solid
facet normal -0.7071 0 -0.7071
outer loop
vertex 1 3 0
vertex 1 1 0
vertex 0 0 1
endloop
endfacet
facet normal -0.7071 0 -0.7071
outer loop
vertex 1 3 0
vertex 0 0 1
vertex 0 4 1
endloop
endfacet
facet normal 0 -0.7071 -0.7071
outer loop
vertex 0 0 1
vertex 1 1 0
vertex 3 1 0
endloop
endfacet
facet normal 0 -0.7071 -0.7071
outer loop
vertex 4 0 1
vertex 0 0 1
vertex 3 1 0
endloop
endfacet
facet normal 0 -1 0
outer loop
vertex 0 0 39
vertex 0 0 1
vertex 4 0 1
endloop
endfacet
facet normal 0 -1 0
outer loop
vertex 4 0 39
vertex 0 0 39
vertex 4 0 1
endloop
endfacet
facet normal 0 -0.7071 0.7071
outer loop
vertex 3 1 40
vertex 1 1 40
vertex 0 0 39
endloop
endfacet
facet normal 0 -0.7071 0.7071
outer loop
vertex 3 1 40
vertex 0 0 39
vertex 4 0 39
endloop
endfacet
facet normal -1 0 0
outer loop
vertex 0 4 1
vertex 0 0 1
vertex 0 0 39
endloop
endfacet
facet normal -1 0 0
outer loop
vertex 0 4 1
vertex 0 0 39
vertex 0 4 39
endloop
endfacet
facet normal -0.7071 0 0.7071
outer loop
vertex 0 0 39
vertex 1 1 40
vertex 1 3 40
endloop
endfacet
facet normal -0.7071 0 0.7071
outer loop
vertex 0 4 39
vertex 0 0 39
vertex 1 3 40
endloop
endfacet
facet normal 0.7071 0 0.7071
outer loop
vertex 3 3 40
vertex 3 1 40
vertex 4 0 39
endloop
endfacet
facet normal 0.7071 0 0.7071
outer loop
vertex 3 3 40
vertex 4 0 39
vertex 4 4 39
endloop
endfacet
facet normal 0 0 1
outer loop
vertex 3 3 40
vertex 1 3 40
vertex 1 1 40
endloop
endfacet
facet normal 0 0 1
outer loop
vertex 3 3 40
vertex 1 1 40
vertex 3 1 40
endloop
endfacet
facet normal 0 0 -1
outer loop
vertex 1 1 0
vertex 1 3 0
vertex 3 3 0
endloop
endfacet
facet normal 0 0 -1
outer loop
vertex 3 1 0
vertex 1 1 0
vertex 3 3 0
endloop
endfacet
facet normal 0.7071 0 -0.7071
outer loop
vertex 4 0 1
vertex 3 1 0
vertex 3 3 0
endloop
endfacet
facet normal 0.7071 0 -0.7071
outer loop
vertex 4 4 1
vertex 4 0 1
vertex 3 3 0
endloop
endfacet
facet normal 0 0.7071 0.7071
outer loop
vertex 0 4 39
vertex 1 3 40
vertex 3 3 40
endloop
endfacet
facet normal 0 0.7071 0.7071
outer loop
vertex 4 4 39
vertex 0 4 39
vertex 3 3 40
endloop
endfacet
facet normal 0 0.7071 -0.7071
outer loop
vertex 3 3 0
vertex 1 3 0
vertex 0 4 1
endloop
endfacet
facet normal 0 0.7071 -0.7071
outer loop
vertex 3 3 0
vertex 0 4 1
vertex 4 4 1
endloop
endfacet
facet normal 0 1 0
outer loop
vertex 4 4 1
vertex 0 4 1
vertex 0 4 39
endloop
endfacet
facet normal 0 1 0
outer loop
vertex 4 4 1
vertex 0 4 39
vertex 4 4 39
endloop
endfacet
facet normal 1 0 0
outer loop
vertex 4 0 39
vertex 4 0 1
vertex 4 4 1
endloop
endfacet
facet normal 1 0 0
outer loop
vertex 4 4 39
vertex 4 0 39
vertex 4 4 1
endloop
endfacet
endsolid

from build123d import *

# Parameters (mm, degrees)
ESQUISSE1_W        = 4
ESQUISSE1_H        = 4
BOSS_EXTRU_1_DEPTH = 40
CHANFREIN1_SIZE    = 1


with BuildPart() as part:
    # Esquisse1 → Boss.-Extru.1 (new body)
    with BuildSketch(Plane.XY):
        with Locations((2, 2)):
            Rectangle(ESQUISSE1_W, ESQUISSE1_H)
    extrude(amount=BOSS_EXTRU_1_DEPTH)

    # Chanfrein1
    chanfrein1_edges = [part.edges().sort_by_distance(p)[0] for p in [
        (4, 2, 40),
        (2, 4, 40),
        (0, 2, 40),
        (2, 4, 0),
        (4, 2, 0),
        (2, 0, 0),
        (0, 2, 0),
        (2, 0, 40),
    ]]
    chamfer(chanfrein1_edges, length=CHANFREIN1_SIZE)


solid = part.part
